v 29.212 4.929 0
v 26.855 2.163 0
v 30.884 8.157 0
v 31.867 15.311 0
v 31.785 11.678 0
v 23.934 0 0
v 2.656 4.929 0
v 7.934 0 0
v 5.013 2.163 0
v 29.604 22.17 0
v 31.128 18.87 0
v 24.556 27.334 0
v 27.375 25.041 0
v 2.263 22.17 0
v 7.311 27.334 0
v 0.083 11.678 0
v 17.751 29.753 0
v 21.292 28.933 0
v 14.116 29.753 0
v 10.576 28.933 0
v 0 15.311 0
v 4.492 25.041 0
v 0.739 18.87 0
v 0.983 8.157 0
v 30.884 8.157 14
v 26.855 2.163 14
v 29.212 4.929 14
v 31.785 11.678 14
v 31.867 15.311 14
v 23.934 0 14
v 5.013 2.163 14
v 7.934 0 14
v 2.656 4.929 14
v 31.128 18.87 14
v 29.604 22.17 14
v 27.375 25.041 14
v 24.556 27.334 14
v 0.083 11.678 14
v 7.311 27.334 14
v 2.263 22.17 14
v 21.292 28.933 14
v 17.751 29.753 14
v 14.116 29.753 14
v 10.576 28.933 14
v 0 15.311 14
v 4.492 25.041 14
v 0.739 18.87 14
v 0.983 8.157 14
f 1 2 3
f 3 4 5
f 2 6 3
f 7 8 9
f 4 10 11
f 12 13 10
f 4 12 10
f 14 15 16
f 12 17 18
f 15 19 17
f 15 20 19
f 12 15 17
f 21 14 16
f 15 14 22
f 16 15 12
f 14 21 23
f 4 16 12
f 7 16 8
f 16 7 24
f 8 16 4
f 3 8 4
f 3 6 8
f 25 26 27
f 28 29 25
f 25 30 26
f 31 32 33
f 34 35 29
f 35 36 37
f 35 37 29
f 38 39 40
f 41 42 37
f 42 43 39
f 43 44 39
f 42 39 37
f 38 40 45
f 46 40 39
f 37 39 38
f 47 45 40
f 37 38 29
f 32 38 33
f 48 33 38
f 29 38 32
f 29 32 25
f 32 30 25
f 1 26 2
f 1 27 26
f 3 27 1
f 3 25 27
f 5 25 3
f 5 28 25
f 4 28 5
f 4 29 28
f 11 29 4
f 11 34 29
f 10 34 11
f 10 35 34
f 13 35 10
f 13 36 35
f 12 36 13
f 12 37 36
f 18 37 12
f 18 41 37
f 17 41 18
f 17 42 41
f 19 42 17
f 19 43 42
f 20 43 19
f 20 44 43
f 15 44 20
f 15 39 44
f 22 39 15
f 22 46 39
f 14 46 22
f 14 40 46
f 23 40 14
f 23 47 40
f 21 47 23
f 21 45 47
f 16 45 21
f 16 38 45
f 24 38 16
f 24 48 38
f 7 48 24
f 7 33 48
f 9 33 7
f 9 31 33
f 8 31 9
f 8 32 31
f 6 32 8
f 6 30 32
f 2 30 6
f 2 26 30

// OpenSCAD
$fn = 32;

// ----------------------------------------------------------------------
// Flat adaptor: single_d, 14 mm thick
// ----------------------------------------------------------------------

// --- parameters (mm) ---
profile_height = 14;      // extrusion height
profile_points = 24;      // points of the closed outline

profile = [[23.934, 0], [26.855, 2.163], [29.212, 4.929], [30.884, 8.157], [31.785, 11.678], [31.867, 15.311], [31.128, 18.87], [29.604, 22.17], [27.375, 25.041], [24.556, 27.334], [21.292, 28.933], [17.751, 29.753], [14.116, 29.753], [10.576, 28.933], [7.311, 27.334], [4.492, 25.041], [2.263, 22.17], [0.739, 18.87], [0, 15.311], [0.083, 11.678], [0.983, 8.157], [2.656, 4.929], [5.013, 2.163], [7.934, 0]];  // single closed polygon, 24 points, counter clockwise

// --- the one profile operation ---
linear_extrude(height = profile_height) polygon(points = profile);
